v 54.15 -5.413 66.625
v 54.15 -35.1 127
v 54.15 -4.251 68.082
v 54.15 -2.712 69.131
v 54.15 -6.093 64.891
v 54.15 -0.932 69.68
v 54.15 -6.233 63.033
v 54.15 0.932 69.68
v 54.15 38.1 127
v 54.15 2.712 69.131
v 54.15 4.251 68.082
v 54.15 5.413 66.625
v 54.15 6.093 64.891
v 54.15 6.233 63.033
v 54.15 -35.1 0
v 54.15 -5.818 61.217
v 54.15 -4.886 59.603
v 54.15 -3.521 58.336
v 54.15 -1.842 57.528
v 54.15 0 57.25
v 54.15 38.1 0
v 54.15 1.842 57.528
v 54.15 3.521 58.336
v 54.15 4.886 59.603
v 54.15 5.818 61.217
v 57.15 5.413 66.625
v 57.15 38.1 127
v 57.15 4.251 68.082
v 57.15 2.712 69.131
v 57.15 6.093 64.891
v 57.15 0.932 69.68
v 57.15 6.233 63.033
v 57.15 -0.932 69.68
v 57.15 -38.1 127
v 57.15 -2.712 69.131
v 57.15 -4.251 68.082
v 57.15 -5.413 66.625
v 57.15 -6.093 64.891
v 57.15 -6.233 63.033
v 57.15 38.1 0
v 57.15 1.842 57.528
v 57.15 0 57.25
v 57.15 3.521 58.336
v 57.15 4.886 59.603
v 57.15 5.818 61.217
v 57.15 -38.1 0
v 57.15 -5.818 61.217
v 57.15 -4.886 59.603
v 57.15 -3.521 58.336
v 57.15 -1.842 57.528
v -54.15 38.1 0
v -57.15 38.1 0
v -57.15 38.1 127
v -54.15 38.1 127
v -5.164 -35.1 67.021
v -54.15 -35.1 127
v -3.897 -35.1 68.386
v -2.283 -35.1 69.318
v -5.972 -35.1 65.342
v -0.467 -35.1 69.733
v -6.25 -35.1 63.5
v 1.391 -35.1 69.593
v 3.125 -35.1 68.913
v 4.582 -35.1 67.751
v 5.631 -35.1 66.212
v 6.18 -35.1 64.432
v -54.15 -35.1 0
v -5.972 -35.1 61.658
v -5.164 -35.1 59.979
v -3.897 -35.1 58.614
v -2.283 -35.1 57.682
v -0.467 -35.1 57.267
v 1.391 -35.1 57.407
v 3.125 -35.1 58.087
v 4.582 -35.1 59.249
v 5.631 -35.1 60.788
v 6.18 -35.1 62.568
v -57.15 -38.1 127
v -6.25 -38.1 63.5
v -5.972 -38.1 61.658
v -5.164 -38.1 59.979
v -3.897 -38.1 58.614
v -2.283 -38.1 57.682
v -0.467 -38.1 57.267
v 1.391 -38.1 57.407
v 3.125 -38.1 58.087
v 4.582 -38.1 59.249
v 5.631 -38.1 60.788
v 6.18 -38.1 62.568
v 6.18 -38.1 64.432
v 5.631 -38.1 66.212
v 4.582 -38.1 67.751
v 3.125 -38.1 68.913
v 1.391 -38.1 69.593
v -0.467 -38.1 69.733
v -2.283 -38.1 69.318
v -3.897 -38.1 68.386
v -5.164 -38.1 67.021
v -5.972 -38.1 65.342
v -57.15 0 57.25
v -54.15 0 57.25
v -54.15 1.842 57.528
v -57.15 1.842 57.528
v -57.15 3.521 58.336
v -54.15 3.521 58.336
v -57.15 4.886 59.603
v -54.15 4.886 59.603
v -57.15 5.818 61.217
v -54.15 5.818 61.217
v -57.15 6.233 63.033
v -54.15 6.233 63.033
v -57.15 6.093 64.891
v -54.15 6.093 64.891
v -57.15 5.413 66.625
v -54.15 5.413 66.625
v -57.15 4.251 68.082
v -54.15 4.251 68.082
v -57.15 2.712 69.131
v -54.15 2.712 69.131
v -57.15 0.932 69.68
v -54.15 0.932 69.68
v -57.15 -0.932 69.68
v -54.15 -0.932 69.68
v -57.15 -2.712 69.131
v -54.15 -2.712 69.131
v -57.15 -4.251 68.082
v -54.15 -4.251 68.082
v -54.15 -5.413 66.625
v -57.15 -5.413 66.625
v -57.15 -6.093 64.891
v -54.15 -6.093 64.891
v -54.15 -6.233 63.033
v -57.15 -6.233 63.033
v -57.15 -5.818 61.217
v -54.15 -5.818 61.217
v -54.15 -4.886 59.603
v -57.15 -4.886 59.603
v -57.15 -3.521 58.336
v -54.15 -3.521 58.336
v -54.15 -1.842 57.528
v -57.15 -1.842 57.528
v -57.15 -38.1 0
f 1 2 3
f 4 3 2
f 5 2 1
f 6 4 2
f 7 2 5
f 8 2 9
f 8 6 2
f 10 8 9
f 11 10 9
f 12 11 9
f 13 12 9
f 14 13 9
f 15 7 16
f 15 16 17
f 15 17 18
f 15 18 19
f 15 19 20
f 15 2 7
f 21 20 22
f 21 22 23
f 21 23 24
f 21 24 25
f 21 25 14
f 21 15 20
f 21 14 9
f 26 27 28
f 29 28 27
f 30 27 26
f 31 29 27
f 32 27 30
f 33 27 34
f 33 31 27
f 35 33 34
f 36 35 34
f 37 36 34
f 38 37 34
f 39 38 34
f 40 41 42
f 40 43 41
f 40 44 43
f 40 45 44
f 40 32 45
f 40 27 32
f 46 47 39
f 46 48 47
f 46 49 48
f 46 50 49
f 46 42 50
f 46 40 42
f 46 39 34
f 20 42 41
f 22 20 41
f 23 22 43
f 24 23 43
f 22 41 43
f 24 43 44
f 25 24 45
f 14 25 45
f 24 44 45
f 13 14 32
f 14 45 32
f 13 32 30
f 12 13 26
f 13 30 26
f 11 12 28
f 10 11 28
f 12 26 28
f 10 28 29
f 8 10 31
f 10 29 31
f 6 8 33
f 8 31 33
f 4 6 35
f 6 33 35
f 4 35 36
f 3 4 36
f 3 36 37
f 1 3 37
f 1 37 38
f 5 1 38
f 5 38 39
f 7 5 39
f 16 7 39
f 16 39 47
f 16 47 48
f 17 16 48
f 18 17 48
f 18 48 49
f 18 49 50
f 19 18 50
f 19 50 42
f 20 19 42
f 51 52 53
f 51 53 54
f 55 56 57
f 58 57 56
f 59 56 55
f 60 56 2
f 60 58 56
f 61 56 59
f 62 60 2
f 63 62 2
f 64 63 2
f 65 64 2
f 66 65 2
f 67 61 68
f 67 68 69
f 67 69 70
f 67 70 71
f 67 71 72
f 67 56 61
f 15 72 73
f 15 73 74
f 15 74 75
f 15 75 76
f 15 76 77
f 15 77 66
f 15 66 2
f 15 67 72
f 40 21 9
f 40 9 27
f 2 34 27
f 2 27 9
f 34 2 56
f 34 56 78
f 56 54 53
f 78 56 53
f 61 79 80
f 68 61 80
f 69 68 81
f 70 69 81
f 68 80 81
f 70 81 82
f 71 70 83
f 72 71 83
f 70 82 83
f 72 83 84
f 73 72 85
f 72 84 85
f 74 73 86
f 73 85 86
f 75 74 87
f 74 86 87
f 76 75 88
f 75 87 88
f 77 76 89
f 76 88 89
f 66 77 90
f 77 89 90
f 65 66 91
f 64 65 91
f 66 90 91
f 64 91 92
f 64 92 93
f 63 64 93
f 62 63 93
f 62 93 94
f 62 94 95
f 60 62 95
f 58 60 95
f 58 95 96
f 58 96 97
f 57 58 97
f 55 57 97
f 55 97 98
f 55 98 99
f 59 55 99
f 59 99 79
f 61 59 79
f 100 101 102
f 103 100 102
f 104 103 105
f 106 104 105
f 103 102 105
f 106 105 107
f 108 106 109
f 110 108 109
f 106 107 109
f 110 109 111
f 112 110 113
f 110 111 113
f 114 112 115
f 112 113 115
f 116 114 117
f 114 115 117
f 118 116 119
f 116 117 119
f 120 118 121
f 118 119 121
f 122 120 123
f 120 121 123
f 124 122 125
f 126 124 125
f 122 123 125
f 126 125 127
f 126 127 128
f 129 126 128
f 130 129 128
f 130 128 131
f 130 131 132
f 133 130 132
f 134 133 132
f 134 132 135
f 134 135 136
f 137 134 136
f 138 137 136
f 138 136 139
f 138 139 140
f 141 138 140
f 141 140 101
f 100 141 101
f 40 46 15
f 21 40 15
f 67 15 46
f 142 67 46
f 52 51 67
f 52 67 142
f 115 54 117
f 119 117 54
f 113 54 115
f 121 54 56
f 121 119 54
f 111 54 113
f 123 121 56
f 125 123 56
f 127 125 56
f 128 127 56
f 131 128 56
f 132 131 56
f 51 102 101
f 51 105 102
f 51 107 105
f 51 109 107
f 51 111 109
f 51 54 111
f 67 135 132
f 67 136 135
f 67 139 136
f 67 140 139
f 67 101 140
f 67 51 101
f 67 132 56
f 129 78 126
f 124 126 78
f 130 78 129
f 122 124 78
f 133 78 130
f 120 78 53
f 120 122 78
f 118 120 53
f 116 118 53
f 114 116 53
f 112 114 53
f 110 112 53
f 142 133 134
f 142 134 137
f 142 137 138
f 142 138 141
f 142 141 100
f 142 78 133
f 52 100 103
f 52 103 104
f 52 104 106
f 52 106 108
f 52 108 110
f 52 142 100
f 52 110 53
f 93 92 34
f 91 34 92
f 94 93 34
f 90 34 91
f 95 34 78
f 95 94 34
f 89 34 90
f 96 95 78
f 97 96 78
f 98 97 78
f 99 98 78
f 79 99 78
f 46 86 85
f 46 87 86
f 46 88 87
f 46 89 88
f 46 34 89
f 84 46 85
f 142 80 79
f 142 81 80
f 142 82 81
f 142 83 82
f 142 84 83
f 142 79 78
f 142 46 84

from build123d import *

# Parameters (mm, degrees)
BOSS_EXTRUDE1_DEPTH          = 127
F_12_5_12_5_DIAMETER_HOLE1_D = 12.5
F_12_5_12_5_DIAMETER_HOLE2_D = 12.5


with BuildPart() as part:
    # Sketch1 → Boss-Extrude1 (new body)
    with BuildSketch(Plane.XY):
        Polygon((54.15, -35.1), (54.15, 38.1), (57.15, 38.1), (57.15, -38.1), (-57.15, -38.1), (-57.15, 38.1), (-54.15, 38.1), (-54.15, -35.1), align=None)
    extrude(amount=BOSS_EXTRUDE1_DEPTH)

    # Ø12.5 (12.5) Diameter Hole1 (through all)
    with Locations(Plane(origin=(0, -35.1, 0), x_dir=(1, 0, 0), z_dir=(0, 1, 0))):
        with Locations((0, -63.5)):
            Hole(F_12_5_12_5_DIAMETER_HOLE1_D / 2)

    # Ø12.5 (12.5) Diameter Hole2 (through all)
    with Locations(Plane.ZY.offset(57.15)):
        with Locations((63.5, 0)):
            Hole(F_12_5_12_5_DIAMETER_HOLE2_D / 2)


solid = part.part
